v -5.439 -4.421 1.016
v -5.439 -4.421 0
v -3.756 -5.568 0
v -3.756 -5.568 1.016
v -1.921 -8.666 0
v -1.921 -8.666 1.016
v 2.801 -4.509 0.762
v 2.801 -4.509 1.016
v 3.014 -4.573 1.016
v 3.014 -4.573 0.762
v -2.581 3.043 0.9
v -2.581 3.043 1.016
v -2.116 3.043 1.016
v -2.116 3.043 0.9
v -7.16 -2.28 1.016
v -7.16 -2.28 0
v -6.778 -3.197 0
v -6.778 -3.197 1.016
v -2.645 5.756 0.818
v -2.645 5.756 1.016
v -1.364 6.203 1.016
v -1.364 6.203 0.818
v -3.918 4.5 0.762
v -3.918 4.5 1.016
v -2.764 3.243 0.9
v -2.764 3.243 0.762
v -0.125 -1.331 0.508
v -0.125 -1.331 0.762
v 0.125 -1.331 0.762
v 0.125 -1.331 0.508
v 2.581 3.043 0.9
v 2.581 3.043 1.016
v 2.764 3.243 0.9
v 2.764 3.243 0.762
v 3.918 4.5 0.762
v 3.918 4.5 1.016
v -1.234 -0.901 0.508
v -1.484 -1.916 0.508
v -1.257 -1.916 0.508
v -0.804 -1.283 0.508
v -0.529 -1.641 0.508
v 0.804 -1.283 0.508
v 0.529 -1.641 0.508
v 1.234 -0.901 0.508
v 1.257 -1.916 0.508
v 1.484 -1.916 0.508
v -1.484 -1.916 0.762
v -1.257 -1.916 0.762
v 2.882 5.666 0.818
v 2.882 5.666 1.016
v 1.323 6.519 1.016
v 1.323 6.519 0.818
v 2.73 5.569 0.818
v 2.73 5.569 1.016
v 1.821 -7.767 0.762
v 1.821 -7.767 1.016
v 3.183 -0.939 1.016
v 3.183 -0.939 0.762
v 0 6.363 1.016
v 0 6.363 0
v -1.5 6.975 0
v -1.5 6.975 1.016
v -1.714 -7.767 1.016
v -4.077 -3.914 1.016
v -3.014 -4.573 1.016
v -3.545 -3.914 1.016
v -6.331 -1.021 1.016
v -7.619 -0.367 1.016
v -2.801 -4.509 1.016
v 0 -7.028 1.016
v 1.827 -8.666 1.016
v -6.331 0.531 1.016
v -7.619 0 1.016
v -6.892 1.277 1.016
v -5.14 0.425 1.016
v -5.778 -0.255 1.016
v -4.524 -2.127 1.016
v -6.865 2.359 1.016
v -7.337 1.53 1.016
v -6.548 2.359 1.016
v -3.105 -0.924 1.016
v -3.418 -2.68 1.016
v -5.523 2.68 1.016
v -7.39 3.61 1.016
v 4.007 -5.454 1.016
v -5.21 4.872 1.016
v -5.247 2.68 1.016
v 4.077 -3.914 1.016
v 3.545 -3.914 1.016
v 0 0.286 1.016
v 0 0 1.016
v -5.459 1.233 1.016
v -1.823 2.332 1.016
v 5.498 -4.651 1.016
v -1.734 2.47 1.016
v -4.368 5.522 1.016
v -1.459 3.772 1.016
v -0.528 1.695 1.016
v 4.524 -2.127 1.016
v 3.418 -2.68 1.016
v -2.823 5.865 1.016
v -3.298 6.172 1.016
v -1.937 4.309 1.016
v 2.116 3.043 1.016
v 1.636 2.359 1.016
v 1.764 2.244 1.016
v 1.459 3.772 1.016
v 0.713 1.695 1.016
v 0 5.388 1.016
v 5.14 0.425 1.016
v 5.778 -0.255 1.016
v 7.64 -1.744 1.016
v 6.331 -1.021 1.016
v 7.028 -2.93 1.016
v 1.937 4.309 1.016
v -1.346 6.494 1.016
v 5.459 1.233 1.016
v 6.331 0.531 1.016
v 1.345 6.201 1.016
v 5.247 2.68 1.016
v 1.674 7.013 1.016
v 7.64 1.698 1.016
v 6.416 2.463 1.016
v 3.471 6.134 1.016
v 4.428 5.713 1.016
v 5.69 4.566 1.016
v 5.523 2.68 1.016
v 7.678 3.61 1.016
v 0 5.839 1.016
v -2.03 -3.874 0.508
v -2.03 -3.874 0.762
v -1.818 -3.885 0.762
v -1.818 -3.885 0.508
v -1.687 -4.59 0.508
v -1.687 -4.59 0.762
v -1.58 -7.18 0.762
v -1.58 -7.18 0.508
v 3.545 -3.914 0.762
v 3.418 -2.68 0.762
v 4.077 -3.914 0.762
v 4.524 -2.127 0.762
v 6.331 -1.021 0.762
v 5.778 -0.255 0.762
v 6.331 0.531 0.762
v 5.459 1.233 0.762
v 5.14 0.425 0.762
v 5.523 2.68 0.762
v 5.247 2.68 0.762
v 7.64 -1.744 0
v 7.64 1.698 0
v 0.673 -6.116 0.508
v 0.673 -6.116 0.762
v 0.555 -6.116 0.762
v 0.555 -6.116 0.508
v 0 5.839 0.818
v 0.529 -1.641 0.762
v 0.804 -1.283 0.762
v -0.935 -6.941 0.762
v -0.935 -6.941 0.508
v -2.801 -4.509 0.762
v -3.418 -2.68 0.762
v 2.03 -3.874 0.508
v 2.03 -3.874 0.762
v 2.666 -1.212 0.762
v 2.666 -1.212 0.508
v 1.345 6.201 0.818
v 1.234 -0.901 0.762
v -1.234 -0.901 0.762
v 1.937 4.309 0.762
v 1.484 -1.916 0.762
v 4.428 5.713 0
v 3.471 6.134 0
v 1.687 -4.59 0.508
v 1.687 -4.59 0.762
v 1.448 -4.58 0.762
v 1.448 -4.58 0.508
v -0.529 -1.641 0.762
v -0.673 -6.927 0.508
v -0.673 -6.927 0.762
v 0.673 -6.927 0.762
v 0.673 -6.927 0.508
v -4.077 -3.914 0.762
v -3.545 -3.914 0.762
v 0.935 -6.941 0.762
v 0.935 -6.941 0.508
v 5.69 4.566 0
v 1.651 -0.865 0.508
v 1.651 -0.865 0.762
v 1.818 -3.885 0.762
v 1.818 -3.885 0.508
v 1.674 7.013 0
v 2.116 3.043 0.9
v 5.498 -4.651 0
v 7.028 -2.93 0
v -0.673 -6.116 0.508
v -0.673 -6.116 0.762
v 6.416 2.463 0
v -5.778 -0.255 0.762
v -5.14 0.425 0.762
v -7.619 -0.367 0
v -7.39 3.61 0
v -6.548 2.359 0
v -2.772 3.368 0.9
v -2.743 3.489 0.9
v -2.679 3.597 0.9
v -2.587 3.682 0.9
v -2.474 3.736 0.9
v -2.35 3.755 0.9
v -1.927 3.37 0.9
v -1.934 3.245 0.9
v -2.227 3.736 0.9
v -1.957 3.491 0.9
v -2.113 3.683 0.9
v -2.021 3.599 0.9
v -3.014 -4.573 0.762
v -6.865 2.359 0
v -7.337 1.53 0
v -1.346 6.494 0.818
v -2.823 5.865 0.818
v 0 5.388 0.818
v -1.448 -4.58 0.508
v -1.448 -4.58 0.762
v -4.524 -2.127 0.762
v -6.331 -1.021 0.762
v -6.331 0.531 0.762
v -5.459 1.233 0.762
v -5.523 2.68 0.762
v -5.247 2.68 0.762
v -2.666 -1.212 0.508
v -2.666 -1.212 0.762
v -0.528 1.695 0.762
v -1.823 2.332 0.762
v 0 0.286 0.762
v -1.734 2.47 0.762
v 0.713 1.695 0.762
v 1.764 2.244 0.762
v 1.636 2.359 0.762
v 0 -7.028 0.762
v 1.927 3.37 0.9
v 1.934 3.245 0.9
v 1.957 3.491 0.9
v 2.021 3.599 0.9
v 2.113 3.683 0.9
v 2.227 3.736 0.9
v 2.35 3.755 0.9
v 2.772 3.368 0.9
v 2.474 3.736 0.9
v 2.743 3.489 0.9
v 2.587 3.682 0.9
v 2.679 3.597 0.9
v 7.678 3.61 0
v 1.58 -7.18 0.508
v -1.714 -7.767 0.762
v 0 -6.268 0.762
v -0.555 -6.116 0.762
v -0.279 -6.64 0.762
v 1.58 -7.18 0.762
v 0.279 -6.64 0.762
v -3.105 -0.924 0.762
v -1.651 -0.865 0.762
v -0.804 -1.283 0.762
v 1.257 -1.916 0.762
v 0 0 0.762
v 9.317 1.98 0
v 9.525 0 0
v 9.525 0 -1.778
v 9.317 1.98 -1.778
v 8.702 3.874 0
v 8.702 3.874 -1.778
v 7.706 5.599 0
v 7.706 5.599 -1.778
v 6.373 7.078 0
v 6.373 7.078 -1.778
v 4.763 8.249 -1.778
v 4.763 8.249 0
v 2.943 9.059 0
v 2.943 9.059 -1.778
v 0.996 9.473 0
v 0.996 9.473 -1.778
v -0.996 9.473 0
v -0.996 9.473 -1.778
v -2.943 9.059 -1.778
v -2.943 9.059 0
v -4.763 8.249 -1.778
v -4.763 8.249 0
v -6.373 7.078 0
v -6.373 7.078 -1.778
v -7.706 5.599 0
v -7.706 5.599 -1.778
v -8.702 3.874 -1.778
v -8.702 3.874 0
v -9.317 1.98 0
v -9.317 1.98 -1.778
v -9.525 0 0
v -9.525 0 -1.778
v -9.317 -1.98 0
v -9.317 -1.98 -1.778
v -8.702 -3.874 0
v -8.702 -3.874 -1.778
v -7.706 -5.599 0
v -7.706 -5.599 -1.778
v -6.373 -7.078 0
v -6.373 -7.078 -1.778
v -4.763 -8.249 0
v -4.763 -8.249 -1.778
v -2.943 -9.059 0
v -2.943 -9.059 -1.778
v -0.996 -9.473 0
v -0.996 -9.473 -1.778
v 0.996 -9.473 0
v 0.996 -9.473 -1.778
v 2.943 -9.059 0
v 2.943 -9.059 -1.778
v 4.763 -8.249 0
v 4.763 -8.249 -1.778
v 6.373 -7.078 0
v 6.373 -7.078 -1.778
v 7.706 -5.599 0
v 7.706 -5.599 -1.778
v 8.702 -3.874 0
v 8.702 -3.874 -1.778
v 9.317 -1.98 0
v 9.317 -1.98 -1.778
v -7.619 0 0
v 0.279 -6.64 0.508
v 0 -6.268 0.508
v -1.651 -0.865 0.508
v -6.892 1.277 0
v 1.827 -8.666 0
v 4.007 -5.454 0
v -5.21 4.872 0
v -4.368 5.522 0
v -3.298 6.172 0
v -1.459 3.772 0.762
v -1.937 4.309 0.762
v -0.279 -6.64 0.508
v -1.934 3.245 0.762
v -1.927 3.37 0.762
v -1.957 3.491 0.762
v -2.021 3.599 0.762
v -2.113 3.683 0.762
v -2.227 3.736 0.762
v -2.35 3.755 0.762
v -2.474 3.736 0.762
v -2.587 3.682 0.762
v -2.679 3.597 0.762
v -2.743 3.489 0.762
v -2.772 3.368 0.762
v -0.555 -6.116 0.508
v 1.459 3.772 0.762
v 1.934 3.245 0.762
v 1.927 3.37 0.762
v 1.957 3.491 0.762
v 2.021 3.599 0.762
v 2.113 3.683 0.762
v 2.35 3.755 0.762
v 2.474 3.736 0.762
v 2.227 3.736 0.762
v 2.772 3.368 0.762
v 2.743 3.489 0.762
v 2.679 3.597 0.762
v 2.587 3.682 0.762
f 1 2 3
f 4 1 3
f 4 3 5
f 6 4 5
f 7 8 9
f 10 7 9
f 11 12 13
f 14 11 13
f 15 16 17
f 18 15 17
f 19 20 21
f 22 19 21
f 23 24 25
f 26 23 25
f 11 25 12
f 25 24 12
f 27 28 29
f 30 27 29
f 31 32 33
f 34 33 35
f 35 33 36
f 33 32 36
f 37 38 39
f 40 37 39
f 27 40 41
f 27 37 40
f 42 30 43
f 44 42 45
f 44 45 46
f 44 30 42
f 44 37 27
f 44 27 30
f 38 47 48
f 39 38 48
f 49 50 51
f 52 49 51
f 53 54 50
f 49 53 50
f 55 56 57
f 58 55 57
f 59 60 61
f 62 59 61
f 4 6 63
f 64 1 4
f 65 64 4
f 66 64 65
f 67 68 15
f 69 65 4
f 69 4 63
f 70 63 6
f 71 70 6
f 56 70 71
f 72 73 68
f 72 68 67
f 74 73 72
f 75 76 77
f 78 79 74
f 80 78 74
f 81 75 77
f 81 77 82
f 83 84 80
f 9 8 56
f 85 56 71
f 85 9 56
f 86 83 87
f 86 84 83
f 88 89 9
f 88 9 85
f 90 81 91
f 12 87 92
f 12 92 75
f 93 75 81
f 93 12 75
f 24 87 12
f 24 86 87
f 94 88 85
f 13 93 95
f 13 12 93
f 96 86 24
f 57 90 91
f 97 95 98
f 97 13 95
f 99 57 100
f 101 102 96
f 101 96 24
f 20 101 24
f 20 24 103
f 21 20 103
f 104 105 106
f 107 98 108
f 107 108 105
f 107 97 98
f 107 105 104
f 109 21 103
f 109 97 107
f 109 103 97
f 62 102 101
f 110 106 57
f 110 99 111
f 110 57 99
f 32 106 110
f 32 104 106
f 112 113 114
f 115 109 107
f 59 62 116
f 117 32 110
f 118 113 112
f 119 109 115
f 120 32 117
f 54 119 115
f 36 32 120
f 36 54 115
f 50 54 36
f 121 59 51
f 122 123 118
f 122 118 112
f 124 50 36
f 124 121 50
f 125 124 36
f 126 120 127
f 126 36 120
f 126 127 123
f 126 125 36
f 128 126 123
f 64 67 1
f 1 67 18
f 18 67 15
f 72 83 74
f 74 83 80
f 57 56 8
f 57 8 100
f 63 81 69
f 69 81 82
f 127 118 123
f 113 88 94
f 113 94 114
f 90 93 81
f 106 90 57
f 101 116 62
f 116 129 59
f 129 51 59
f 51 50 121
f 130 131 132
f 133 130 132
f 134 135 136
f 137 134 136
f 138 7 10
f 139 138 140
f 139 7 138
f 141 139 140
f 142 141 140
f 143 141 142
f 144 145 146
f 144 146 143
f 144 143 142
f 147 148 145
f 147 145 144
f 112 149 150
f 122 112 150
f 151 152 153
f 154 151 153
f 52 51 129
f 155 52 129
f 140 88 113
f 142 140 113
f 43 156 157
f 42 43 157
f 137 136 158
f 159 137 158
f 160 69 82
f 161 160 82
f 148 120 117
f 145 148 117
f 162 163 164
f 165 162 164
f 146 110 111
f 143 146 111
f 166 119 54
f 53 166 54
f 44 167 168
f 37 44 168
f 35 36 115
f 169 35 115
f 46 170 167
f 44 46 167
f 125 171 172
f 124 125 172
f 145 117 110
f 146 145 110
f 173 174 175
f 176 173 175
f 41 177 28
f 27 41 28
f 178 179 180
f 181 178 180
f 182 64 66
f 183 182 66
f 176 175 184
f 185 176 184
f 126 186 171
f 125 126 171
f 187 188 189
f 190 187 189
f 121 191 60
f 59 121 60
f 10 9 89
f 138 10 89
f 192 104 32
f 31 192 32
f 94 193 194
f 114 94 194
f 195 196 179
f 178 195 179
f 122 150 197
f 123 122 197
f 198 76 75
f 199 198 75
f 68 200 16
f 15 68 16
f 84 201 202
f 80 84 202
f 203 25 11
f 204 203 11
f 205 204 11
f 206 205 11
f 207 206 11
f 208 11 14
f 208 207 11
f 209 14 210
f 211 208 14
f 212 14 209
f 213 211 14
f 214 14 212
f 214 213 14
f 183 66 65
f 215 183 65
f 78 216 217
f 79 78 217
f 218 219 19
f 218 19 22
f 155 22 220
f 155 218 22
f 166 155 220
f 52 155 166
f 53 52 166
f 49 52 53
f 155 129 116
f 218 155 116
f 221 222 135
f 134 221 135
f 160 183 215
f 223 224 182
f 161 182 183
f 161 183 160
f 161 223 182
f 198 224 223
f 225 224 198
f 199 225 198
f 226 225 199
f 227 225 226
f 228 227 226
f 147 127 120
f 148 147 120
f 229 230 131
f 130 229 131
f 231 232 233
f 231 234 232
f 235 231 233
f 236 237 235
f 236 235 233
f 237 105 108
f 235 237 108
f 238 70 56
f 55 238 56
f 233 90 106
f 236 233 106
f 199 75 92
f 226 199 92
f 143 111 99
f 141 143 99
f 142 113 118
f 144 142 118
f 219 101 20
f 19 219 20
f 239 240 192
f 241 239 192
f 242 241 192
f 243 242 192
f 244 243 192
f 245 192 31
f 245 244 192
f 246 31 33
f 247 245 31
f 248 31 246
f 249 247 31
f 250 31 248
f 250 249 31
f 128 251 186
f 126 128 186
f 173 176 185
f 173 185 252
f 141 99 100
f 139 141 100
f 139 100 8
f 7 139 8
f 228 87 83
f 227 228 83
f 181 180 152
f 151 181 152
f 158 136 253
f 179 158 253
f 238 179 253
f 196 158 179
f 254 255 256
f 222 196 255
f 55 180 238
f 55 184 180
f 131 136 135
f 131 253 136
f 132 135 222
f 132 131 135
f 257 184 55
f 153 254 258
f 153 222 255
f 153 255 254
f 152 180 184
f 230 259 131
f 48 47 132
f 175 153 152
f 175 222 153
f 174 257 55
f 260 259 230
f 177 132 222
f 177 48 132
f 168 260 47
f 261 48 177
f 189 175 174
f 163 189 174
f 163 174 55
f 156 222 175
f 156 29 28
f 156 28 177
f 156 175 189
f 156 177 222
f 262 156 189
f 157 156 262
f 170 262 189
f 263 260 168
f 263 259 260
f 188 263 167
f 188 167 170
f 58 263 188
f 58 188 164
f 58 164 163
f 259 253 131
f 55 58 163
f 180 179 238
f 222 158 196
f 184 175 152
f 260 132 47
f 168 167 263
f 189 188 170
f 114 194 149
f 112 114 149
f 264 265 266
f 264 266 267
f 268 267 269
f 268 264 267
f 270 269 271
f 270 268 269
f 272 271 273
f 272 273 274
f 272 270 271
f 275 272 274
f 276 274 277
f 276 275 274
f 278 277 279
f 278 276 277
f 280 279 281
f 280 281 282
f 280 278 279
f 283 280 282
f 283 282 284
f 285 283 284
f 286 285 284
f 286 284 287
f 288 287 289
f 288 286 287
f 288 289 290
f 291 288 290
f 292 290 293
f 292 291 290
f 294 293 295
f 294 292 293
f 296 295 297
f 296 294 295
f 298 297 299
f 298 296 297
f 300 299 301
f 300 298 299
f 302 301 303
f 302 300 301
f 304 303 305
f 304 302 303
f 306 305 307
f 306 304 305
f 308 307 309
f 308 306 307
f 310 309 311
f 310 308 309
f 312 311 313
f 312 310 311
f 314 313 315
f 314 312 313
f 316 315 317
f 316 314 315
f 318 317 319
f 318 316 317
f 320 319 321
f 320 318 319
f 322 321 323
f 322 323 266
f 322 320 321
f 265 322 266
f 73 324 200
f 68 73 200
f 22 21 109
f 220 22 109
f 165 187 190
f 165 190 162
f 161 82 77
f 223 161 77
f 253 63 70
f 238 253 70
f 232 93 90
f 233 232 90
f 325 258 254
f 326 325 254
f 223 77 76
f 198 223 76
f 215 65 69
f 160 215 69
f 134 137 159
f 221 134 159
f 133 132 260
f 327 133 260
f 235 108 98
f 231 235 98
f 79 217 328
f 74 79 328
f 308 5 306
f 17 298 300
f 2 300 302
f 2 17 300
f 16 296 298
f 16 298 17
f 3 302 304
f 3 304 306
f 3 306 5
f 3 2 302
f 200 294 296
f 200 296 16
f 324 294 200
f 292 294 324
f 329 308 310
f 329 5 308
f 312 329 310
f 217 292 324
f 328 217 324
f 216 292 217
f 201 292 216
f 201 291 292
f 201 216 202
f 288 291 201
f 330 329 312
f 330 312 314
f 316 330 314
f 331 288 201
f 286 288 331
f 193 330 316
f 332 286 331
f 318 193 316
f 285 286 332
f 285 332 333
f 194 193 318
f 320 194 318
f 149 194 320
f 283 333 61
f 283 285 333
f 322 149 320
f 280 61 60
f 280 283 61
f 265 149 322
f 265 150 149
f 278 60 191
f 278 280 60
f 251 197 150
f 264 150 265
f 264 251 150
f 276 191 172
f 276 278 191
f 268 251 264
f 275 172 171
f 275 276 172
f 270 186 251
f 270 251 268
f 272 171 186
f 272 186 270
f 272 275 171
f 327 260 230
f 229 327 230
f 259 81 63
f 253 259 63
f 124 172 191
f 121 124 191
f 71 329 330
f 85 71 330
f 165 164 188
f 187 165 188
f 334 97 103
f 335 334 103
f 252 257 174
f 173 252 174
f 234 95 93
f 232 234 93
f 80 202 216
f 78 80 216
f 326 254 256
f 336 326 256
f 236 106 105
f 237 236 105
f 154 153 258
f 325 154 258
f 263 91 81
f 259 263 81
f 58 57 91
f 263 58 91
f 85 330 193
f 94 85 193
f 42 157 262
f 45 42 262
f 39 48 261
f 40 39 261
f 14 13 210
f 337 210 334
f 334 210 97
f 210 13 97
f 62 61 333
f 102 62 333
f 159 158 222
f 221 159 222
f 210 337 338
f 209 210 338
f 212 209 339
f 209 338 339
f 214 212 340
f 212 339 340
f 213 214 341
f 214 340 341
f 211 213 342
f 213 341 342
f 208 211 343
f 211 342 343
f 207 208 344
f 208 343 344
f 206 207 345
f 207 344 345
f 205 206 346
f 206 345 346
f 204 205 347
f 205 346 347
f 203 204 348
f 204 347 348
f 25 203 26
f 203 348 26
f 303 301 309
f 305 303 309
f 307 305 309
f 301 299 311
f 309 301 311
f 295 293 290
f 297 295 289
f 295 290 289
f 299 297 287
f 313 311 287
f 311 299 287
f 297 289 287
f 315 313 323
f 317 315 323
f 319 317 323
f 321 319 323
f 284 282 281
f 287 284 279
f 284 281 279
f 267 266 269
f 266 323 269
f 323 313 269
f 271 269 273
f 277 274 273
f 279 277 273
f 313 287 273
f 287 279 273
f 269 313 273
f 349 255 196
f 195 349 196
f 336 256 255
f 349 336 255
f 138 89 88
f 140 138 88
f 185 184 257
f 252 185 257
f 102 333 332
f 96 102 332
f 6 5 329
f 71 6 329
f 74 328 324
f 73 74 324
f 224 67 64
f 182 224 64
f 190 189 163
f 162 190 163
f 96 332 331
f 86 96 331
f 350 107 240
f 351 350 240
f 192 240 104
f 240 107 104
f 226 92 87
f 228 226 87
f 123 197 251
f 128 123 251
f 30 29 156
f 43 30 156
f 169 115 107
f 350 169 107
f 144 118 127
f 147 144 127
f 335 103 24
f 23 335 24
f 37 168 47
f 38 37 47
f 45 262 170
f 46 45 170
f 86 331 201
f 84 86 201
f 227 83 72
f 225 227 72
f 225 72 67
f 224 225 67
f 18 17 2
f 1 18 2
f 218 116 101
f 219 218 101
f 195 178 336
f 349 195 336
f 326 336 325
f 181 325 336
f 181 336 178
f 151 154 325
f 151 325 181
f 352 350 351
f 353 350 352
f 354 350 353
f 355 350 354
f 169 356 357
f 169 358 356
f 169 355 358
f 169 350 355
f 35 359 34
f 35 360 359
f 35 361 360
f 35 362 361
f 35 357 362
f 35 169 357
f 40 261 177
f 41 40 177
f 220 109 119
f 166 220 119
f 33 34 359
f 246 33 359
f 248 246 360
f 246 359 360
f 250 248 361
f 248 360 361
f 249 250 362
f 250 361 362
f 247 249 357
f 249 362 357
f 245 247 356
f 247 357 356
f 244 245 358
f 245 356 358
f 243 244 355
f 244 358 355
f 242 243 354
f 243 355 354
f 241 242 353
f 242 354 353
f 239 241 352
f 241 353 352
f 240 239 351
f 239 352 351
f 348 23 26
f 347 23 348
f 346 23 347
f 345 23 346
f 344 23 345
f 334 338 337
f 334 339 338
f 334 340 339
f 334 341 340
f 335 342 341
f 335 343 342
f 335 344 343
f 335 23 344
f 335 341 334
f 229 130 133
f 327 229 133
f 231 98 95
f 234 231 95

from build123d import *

# Parameters (mm, degrees)
F2_DEPTH  = 1.016
F0_R      = 9.525
F3_DEPTH  = 1.778
F5_DEPTH  = 0.73658
F8_DEPTH  = 0.19799
F10_DEPTH = 0.254
F12_DEPTH = 0.254
F14_DEPTH = 0.254
F16_DEPTH = 0.13808
F18_DEPTH = 0.254


with BuildPart() as f2:
    # F1 (on Top) → F2 (new body)
    with BuildSketch(Plane.XY):
        Polygon((-5.2096517757, 4.8718452454), (-7.3895002715, 3.6098279525), (-6.5481550992, 2.3594415264), (-6.86526423, 2.3594415264), (-7.3371550568, 1.5301066978), (-6.8923411891, 1.2770079775), (-7.6189576648, 0), (-7.6189576648, -0.3674388281), (-7.1600424126, -2.2795863915), (-6.7776124924, -3.1974171288), (-5.4391096346, -4.4211917557), (-3.7564195227, -5.5684801191), (-1.9207580481, -8.6661595851), (1.8270511646, -8.6661595851), (4.0068994276, -5.4537514225), (5.4983743466, -4.6506496146), (7.0280926302, -2.9297166038), (7.639979478, -1.7441851087), (7.639979478, -0.7116254419), (7.639979478, 0.3974201391), (7.639979478, 1.0475503514), (7.639979478, 1.6976804473), (6.4162053168, 2.4625393562), (7.6782228425, 3.6098279525), (5.6895888411, 4.5659020543), (4.427571781, 5.7131904177), (3.471497912, 6.1338627711), (1.6740793362, 7.0134503767), (0, 6.36332063), (-1.5000854619, 6.9752074778), (-3.2975040376, 6.17210567), (-4.3683070689, 5.5219754577), align=None)
    extrude(amount=F2_DEPTH)

    # F0 (on Top) → F3 (join)
    with BuildSketch(Plane.XY):
        Circle(F0_R)
    extrude(amount=-F3_DEPTH)

    # F7 (on face) → F8 (cut)
    with BuildSketch(Plane.XY.offset(1.016)):
        Polygon((-1.3463342329, 6.4942925237), (-2.822693903, 5.8646216057), (-2.6447118726, 5.755500868), (-1.3636830263, 6.2029086985), (0, 5.3883814253), (1.3446520315, 6.2008285895), (2.729951404, 5.569380708), (2.881785389, 5.6656086817), (1.3232411584, 6.5193735063), (0, 5.8390707709), align=None)
    extrude(amount=-F8_DEPTH, mode=Mode.SUBTRACT)

    # F9 (on face) → F10 (cut)
    with BuildSketch(Plane.XY.offset(1.016)):
        Polygon((-3.0135090929, -4.5730909333), (-2.8008187655, -4.5092836954), (-3.4176206682, -2.6801475324), (-4.5236102305, -2.1271528676), (-5.7784831151, -0.2554782841), (-5.1404121332, 0.4251306527), (-5.4594473913, 1.2333536288), (-5.246757064, 2.679647645), (-5.5232541636, 2.679647645), (-6.3314777799, 0.5314758164), (-6.3314777799, -1.0211633053), (-4.0769609623, -3.9137513377), (-3.545235144, -3.9137513377), align=None)
        Polygon((5.5232541636, 2.679647645), (5.246757064, 2.679647645), (5.4594473913, 1.2333536288), (5.1404121332, 0.4251306527), (5.7784831151, -0.2554782841), (4.5236102305, -2.1271528676), (3.4176206682, -2.6801475324), (2.8008187655, -4.5092836954), (3.0135090929, -4.5730909333), (3.545235144, -3.9137513377), (4.0769609623, -3.9137513377), (6.3314777799, -1.0211633053), (6.3314777799, 0.5314758164), align=None)
    extrude(amount=-F10_DEPTH, mode=Mode.SUBTRACT)

    # F11 (on face) → F12 (cut)
    with BuildSketch(Plane.XY.offset(1.016)):
        Polygon((0, 0), (-3.1052604318, -0.9244027315), (-1.7141137505, -7.7665727586), (0, -7.0284130052), (1.820534002, -7.7665727586), (3.1832898967, -0.938598183), align=None)
    extrude(amount=-F12_DEPTH, mode=Mode.SUBTRACT)

    # F13 (on face) → F14 (cut)
    with BuildSketch(Plane.XY.offset(1.016)):
        Polygon((-1.822640141, 2.3322773777), (0, 0.2859818342), (1.7637592973, 2.2436233703), (1.6359017026, 2.3588181173), (0.7133174804, 1.6945287352), (-0.5281137419, 1.6945287352), (-1.7337343888, 2.4704232346), align=None)
        Polygon((-2.1157131996, 3.043391509), (-1.4591871295, 3.7715386134), (-1.9366606139, 4.3086963706), (-3.9181755856, 4.4996854849), (-2.5812499225, 3.043391509), align=None)
        Polygon((1.4591871295, 3.7715386134), (2.1157131996, 3.043391509), (2.5812499225, 3.043391509), (3.9181755856, 4.4996854849), (1.9366606139, 4.3086963706), align=None)
    extrude(amount=-F14_DEPTH, mode=Mode.SUBTRACT)

    # F15 (on face) → F16 (join)
    with BuildSketch(Plane.XY.offset(0.762)):
        with BuildLine():
            Line((2.5812499225, 3.043391509), (2.7644233944, 3.2429197483))
            ThreePointArc((2.7644233944, 3.2429197483), (2.3504007339, 3.7546674576), (1.9342565257, 3.2446434588))
            Line((1.9342565257, 3.2446434588), (2.1157131996, 3.043391509))
            Line((2.1157131996, 3.043391509), (2.5812499225, 3.043391509))
        make_face()
        with BuildLine():
            Line((-2.7644233944, 3.2429197483), (-2.5812499225, 3.043391509))
            Line((-2.5812499225, 3.043391509), (-2.1157131996, 3.043391509))
            Line((-2.1157131996, 3.043391509), (-1.9342565257, 3.2446434588))
            ThreePointArc((-1.9342565257, 3.2446434588), (-2.3504007339, 3.7546674576), (-2.7644233944, 3.2429197483))
        make_face()
    extrude(amount=F16_DEPTH)

    # F17 (on face) → F18 (cut)
    with BuildSketch(Plane.XY.offset(0.762)):
        Polygon((-1.6513522714, -0.8654528065), (-2.665983513, -1.2116211001), (-2.0300412055, -3.8737652845), (-1.8184679793, -3.8854728919), align=None)
        Polygon((-1.5797313536, -7.1800402366), (-0.9351419867, -6.9413036108), (-1.4483418965, -4.579841237), (-1.6871627886, -4.5897462405), align=None)
        Polygon((1.5797313536, -7.1800402366), (1.6871627886, -4.5897462405), (1.4483418965, -4.579841237), (0.9351419867, -6.9413036108), align=None)
        Polygon((1.6513522714, -0.8654528065), (1.8184679793, -3.8854728919), (2.0300412055, -3.8737652845), (2.665983513, -1.2116211001), align=None)
        Polygon((0.1592475164, -0.9012632072), (-0.1592475164, -0.9012632072), (-1.2335629435, -0.9012632072), (-1.4842365636, -1.9158945652), (-1.2574365828, -1.9158945652), (-0.803836796, -1.283242018), (-0.5292895366, -1.6413471894), (-0.1250742725, -1.3314488641), (0.1250742725, -1.3314488641), (0.5292895366, -1.6413471894), (0.803836796, -1.283242018), (1.2574365828, -1.9158945652), (1.4842365636, -1.9158945652), (1.2335629435, -0.9012632072), align=None)
        Polygon((-0.6731920876, -6.11623656), (-0.6731920876, -6.9274515845), (-0.1211152558, -6.9274515845), (0.1211152558, -6.9274515845), (0.6731920876, -6.9274515845), (0.6731920876, -6.11623656), (0.5548899644, -6.11623656), (0.2788515121, -6.6401464865), (0, -6.2683396973), (-0.2788515121, -6.6401464865), (-0.5548899644, -6.11623656), align=None)
    extrude(amount=-F18_DEPTH, mode=Mode.SUBTRACT)


with BuildPart() as f5:
    # F4 (on face) → F5 (new body)
    with BuildSketch(Plane.XY.offset(1.016)):
        Polygon((17.713438698, 4.5463088655), (15.3496832919, 3.1778191726), (16.2620100905, 1.8219416059), (15.9181474671, 1.8219416059), (15.4064447065, 0.9226384258), (15.8887861108, 0.6481865685), (15.1008673055, -0.7365585255), (15.1008673055, -1.1349970032), (15.5984997833, -3.2084663974), (16.013194104, -4.2037316056), (17.4646222066, -5.5307522199), (19.2892755512, -6.7748336671), (21.2798059676, -10.1338545338), (25.3438059676, -10.1338545338), (27.7075611212, -6.6504256738), (29.324867053, -5.7795687113), (30.9836428208, -3.9134460356), (31.647152623, -2.6278950049), (31.647152623, -1.508221551), (31.647152623, -0.3056093086), (31.647152623, 0.3993703296), (31.647152623, 1.1043498415), (30.3201325137, 1.933737473), (31.688622459, 3.1778191726), (29.5322137084, 4.2145542169), (28.163724268, 5.458635664), (27.1269894762, 5.9147988108), (25.1779283908, 6.8685944355), (23.3626122858, 6.1636153022), (21.7359693669, 6.8271251044), (19.7869082815, 5.9562681419), (18.6257649916, 5.2512885037), align=None)
        Polygon((18.439305509, 1.7165624937), (18.4358818544, 1.7216506446), (19.9132289832, 2.5769567026), (20.4834329167, 3.0175689765), (21.2091474729, 3.4581812504), (22.4273106513, 4.0024668519), (23.4439624756, 3.5877732256), (23.4679646927, 3.5970945015), (25.3034550697, 4.8505836166), (25.7937528554, 3.4337042665), (25.7966982196, 3.4322629184), (26.4446574645, 3.1471609517), (27.2999633647, 2.3696100472), (28.6477188339, 1.7216506446), (28.6426317994, 1.7170260681), (28.6477188339, 1.7145803783), (27.7970213842, 0.9412191032), (28.6218001864, 0.4257323126), (28.6218001864, 0.4186620463), (28.6218001864, -0.5960899286), (28.6218001864, -0.6644358361), (28.6218001864, -1.0367022025), (28.6218001864, -1.1050481099), (28.6218001864, -1.7883348539), (28.6218001864, -1.8566807614), (28.6218001864, -1.9069207164), (28.6218001864, -1.9139909827), (28.20710656, -2.7174603769), (27.1703717051, -3.8837870492), (26.1595554977, -4.4280726508), (24.6822085267, -6.6052156882), (22.1422085267, -6.6052156882), (20.8981270165, -4.5058276465), (19.7577186761, -3.7282767421), (18.850576112, -2.8988888581), (18.5913921616, -2.276848103), (18.2803718629, -0.9809297316), (18.2803718629, -0.9738594653), (18.2803718629, -0.7319056831), (18.2803718629, -0.7248354168), (18.7697820642, 0.1352892187), (18.4713577386, 0.3050924115), (18.4743967906, 0.3104334598), (18.4713577386, 0.3121626778), (18.7911719639, 0.8742271654), (19.0013287467, 0.8742271654), (18.4358818544, 1.7145803783), align=None, mode=Mode.SUBTRACT)
    extrude(amount=F5_DEPTH)


solid = f2.part
